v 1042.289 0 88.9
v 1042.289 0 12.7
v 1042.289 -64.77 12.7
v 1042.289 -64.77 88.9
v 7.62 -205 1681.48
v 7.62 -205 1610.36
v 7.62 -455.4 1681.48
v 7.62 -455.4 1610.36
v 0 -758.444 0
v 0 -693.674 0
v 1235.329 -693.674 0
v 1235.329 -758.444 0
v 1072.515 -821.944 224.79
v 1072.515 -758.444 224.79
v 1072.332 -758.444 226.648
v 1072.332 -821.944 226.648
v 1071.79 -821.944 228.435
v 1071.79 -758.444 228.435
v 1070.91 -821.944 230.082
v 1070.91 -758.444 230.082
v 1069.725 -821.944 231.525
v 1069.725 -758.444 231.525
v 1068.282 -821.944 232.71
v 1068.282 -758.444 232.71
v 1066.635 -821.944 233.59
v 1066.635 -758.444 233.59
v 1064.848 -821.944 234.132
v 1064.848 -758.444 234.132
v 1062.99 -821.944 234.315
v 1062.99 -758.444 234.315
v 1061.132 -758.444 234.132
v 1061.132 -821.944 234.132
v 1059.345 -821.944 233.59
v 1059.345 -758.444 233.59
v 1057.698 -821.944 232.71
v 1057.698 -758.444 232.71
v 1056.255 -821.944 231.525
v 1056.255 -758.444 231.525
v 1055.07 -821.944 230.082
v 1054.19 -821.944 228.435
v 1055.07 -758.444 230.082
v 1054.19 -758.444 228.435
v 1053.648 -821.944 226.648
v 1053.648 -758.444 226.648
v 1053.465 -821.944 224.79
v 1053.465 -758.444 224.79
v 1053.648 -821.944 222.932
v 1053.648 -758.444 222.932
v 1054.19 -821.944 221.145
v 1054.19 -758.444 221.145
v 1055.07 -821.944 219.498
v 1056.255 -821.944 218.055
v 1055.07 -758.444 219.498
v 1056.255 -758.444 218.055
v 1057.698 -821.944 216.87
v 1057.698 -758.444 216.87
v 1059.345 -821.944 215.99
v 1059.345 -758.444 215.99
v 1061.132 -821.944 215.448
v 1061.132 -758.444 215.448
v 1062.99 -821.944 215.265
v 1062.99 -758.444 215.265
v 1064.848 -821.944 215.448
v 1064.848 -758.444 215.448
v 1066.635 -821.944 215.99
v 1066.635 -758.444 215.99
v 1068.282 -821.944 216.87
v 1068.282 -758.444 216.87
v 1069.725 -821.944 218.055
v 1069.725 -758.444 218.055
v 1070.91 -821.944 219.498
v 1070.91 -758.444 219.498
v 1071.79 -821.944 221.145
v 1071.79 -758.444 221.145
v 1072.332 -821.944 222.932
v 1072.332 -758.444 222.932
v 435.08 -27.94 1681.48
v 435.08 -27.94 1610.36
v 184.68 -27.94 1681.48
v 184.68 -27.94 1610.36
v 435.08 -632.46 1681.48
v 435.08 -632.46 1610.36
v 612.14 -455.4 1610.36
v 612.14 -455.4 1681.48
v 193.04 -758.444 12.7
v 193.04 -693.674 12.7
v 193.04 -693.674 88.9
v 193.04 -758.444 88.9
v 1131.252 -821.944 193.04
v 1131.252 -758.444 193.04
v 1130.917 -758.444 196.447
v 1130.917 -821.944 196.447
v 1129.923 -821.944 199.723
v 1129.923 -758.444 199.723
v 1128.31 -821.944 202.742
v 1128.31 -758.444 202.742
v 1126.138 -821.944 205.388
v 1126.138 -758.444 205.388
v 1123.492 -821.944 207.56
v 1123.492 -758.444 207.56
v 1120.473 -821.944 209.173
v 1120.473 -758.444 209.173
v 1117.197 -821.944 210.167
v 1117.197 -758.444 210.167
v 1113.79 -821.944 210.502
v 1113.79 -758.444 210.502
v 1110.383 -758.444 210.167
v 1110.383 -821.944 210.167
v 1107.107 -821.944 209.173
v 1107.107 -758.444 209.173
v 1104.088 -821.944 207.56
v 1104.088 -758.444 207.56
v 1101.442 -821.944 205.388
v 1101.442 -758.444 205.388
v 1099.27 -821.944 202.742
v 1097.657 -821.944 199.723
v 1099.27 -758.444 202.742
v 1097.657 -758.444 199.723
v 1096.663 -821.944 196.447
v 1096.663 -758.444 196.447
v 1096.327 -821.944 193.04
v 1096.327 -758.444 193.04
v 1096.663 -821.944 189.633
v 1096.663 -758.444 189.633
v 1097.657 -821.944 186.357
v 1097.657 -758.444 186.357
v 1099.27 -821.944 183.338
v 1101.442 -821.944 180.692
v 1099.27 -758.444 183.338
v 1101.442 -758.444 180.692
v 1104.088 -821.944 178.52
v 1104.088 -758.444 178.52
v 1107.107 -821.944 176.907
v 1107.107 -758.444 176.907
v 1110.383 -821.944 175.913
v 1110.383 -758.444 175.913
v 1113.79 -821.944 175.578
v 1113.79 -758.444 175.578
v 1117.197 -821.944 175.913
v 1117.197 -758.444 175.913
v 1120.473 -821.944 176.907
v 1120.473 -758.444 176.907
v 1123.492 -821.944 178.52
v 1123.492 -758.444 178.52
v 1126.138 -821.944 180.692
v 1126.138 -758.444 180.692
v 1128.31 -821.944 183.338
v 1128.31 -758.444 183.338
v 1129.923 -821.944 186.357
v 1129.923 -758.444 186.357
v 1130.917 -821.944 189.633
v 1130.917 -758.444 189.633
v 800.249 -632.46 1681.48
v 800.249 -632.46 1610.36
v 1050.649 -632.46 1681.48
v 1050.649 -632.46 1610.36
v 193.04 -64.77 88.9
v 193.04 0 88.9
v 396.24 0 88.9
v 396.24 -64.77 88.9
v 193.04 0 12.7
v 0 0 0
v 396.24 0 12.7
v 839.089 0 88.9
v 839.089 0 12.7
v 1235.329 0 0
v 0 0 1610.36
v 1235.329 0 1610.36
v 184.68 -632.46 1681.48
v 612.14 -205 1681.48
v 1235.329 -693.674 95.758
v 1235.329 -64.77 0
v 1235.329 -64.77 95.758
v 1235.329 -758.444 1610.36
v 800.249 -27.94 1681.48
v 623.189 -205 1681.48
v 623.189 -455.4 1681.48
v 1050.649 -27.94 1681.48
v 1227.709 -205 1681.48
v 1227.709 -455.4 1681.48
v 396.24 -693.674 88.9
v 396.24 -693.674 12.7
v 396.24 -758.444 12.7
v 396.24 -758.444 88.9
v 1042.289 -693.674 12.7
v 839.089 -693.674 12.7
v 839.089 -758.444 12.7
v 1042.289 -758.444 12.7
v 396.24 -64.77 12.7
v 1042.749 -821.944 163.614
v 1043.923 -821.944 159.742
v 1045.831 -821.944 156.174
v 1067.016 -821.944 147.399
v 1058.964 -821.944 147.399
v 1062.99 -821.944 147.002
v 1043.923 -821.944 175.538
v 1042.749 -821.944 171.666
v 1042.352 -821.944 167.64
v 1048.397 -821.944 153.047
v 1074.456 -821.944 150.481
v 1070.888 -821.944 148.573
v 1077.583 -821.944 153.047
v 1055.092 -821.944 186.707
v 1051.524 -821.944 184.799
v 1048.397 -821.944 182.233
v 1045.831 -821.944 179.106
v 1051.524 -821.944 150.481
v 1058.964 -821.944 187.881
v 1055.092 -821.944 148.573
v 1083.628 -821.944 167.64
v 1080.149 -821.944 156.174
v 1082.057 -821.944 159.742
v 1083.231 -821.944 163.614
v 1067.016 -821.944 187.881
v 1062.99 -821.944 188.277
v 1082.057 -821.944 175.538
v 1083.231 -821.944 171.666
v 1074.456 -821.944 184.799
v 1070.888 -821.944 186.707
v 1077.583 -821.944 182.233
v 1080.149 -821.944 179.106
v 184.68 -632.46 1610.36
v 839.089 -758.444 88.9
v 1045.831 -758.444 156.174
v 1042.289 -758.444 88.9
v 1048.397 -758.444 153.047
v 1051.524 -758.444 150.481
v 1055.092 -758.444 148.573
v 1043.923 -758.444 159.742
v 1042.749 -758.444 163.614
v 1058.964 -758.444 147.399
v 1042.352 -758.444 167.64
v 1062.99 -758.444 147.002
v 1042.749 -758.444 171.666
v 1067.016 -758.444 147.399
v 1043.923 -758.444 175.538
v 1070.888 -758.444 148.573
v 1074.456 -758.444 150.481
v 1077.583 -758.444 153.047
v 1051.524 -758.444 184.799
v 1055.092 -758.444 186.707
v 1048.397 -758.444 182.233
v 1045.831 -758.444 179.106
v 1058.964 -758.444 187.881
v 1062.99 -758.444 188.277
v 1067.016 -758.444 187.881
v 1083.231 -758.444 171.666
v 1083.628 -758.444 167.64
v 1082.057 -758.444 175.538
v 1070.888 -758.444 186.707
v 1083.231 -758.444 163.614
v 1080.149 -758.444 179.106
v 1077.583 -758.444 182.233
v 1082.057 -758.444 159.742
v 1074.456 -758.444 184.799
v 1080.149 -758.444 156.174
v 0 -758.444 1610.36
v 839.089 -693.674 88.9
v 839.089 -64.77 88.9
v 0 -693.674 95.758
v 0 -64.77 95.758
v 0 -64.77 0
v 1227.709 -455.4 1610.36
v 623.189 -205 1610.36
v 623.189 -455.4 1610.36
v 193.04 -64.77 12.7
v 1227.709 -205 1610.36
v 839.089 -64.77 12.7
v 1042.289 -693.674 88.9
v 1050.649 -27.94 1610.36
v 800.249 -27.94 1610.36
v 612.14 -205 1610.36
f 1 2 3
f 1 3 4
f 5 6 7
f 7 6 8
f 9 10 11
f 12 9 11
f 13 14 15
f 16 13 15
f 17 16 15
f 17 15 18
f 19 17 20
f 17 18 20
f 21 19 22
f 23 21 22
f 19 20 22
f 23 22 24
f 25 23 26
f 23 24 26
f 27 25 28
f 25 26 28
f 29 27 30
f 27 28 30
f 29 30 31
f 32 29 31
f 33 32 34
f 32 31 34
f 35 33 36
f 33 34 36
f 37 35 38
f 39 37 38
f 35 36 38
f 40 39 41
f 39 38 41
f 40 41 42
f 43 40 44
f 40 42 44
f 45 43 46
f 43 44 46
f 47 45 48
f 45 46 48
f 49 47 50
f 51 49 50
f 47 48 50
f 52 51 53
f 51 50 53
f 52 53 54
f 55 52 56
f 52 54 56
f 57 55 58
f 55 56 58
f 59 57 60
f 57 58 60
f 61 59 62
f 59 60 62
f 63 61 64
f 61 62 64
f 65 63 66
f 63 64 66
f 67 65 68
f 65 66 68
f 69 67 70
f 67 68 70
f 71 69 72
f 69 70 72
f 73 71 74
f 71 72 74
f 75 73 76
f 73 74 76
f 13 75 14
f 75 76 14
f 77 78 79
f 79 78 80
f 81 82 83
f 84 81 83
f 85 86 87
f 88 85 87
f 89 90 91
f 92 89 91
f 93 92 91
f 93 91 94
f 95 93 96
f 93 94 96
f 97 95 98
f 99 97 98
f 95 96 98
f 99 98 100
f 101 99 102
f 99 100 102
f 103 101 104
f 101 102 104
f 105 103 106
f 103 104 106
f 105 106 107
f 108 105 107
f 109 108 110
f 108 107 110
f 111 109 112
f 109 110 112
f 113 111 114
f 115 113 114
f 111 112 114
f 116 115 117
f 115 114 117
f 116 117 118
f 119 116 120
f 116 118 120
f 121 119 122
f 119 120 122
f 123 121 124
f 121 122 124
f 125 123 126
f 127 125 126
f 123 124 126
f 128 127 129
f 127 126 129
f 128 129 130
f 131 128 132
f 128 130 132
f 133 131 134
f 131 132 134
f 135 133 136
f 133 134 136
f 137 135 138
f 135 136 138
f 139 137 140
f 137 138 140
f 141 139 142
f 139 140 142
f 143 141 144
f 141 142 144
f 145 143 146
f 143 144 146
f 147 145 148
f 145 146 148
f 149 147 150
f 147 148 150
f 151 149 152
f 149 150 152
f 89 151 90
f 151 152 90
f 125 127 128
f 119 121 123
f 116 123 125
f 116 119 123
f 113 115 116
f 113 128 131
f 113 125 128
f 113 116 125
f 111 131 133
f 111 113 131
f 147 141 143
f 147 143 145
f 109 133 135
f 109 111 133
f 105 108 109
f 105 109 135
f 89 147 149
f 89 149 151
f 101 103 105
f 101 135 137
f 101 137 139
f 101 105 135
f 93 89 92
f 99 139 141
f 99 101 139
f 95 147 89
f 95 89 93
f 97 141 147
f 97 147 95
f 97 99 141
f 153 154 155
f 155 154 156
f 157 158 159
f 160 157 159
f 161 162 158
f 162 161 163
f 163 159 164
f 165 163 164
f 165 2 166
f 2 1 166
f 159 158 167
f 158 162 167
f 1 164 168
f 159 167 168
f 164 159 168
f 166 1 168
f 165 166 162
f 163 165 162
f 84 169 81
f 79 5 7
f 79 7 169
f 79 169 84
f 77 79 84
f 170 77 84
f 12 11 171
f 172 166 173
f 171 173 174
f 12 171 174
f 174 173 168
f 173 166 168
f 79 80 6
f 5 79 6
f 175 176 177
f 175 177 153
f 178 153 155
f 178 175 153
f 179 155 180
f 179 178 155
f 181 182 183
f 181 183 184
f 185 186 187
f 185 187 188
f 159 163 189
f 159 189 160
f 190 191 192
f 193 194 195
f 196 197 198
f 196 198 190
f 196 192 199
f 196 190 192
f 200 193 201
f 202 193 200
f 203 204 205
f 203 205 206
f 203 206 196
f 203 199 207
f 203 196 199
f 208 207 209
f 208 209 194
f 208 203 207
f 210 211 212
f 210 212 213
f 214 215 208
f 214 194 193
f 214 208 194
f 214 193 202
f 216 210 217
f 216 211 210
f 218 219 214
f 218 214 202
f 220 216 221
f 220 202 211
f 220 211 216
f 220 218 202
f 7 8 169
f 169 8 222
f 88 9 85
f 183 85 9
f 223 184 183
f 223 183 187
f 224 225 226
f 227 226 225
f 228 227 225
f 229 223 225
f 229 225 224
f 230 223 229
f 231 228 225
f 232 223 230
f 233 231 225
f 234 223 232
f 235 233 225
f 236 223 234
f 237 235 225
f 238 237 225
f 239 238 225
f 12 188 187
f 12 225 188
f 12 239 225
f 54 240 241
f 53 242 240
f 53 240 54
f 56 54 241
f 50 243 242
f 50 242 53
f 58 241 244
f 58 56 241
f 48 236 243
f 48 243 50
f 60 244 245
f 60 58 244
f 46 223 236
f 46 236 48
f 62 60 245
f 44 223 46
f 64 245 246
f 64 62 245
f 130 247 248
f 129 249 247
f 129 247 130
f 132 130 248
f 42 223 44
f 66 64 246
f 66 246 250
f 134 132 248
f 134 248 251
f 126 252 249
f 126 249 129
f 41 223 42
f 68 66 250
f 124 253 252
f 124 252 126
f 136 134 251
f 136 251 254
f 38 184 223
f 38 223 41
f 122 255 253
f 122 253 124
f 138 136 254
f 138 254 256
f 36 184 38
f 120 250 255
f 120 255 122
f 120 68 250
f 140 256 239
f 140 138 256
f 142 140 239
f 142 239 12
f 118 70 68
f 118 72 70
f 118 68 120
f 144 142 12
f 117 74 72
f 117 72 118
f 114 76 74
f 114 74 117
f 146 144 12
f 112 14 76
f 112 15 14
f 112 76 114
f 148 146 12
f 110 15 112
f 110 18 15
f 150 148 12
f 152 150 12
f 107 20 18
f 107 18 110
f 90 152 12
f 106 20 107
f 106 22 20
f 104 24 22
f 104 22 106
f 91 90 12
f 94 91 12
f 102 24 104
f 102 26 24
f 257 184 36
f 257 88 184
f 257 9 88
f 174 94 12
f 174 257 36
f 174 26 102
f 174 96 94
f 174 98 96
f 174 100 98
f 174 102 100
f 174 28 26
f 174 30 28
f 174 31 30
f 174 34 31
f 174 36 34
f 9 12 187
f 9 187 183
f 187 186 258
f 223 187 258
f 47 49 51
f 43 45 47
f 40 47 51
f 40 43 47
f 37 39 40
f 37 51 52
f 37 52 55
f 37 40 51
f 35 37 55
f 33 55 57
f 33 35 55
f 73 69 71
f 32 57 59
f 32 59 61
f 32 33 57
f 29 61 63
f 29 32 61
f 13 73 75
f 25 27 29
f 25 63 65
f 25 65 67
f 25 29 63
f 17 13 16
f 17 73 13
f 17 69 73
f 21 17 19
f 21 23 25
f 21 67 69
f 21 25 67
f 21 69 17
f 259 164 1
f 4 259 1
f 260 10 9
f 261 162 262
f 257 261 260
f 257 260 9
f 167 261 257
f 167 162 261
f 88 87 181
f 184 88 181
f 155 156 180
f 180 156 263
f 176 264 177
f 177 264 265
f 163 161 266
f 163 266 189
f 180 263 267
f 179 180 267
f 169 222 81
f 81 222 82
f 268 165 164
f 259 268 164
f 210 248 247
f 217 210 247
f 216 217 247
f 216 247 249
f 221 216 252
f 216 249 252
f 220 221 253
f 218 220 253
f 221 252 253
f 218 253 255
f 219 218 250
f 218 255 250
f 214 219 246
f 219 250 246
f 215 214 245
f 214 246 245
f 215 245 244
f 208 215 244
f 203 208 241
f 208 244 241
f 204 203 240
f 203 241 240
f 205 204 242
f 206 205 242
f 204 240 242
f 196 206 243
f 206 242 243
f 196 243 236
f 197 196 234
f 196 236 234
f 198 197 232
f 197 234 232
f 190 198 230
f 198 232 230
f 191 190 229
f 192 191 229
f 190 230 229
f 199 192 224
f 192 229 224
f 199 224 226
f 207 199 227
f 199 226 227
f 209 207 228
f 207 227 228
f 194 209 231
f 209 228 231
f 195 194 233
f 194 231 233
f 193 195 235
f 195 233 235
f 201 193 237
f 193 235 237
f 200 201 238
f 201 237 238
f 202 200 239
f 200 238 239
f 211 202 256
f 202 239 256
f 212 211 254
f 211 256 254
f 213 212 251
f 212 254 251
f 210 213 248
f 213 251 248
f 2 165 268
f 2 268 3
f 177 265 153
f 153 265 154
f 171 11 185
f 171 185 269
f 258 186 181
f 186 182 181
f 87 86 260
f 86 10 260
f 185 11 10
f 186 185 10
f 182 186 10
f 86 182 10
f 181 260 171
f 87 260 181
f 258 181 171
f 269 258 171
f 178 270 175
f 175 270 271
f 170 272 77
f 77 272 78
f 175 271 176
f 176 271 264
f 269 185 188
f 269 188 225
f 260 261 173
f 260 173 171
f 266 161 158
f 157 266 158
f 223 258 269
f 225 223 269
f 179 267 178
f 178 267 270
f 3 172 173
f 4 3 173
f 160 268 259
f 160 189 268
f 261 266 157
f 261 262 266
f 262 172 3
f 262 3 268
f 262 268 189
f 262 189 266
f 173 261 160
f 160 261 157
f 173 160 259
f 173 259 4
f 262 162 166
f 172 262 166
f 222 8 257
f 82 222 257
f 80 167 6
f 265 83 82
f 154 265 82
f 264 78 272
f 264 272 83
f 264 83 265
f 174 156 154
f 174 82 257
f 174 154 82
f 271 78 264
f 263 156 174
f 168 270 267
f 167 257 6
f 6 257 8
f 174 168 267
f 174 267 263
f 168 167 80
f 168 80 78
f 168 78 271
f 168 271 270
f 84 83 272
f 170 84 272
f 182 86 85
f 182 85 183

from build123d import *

# Parameters (mm, degrees)
F0_W     = 1235.329
F0_H     = 1610.36
F0_W_2   = 203.2
F0_H_2   = 76.2
F1_DEPTH = 758.444
F2_W     = 628.904
F2_H     = 203.2
F3_DEPTH = 1235.33
F5_DEPTH = 71.12
F6_R     = 9.525
F6_R_2   = 17.4625
F6_R_3   = 20.6375
F7_DEPTH = 63.5


with BuildPart() as f1:
    # F0 (on Front) → F1 (new body)
    with BuildSketch(Plane.XZ):
        with Locations((617.6645, 805.18)):
            Rectangle(F0_W, F0_H)
        with Locations((294.64, 50.8)):
            Rectangle(F0_W_2, F0_H_2, mode=Mode.SUBTRACT)
        with Locations((940.689, 50.8)):
            Rectangle(F0_W_2, F0_H_2, mode=Mode.SUBTRACT)
    extrude(amount=F1_DEPTH)

    # F2 (on face) → F3 (cut, through all)
    with BuildSketch(Plane(origin=(0, 0, 0), x_dir=(0, -1, 0), z_dir=(-1, 0, 0))):
        with Locations((379.222, -5.842)):
            Rectangle(F2_W, F2_H)
    extrude(amount=-F3_DEPTH, mode=Mode.SUBTRACT)

    # F4 (on face) → F5 (join)
    with BuildSketch(Plane.XY.offset(1610.36)):
        Polygon((435.080191, -632.46), (612.14, -455.400191), (612.14, -204.999809), (435.080191, -27.94), (184.679809, -27.94), (7.62, -204.999809), (7.62, -455.400191), (184.679809, -632.46), align=None)
        Polygon((1050.649191, -632.46), (1227.709, -455.400191), (1227.709, -204.999809), (1050.649191, -27.94), (800.248809, -27.94), (623.189, -204.999809), (623.189, -455.400191), (800.248809, -632.46), align=None)
    extrude(amount=F5_DEPTH)

    # F6 (on face) → F7 (join)
    with BuildSketch(Plane.XZ.offset(758.444)):
        with Locations((1062.99, 224.79)):
            Circle(F6_R)
        with Locations((1113.79, 193.04)):
            Circle(F6_R_2)
        with Locations((1062.99, 167.64)):
            Circle(F6_R_3)
    extrude(amount=F7_DEPTH)


solid = f1.part
